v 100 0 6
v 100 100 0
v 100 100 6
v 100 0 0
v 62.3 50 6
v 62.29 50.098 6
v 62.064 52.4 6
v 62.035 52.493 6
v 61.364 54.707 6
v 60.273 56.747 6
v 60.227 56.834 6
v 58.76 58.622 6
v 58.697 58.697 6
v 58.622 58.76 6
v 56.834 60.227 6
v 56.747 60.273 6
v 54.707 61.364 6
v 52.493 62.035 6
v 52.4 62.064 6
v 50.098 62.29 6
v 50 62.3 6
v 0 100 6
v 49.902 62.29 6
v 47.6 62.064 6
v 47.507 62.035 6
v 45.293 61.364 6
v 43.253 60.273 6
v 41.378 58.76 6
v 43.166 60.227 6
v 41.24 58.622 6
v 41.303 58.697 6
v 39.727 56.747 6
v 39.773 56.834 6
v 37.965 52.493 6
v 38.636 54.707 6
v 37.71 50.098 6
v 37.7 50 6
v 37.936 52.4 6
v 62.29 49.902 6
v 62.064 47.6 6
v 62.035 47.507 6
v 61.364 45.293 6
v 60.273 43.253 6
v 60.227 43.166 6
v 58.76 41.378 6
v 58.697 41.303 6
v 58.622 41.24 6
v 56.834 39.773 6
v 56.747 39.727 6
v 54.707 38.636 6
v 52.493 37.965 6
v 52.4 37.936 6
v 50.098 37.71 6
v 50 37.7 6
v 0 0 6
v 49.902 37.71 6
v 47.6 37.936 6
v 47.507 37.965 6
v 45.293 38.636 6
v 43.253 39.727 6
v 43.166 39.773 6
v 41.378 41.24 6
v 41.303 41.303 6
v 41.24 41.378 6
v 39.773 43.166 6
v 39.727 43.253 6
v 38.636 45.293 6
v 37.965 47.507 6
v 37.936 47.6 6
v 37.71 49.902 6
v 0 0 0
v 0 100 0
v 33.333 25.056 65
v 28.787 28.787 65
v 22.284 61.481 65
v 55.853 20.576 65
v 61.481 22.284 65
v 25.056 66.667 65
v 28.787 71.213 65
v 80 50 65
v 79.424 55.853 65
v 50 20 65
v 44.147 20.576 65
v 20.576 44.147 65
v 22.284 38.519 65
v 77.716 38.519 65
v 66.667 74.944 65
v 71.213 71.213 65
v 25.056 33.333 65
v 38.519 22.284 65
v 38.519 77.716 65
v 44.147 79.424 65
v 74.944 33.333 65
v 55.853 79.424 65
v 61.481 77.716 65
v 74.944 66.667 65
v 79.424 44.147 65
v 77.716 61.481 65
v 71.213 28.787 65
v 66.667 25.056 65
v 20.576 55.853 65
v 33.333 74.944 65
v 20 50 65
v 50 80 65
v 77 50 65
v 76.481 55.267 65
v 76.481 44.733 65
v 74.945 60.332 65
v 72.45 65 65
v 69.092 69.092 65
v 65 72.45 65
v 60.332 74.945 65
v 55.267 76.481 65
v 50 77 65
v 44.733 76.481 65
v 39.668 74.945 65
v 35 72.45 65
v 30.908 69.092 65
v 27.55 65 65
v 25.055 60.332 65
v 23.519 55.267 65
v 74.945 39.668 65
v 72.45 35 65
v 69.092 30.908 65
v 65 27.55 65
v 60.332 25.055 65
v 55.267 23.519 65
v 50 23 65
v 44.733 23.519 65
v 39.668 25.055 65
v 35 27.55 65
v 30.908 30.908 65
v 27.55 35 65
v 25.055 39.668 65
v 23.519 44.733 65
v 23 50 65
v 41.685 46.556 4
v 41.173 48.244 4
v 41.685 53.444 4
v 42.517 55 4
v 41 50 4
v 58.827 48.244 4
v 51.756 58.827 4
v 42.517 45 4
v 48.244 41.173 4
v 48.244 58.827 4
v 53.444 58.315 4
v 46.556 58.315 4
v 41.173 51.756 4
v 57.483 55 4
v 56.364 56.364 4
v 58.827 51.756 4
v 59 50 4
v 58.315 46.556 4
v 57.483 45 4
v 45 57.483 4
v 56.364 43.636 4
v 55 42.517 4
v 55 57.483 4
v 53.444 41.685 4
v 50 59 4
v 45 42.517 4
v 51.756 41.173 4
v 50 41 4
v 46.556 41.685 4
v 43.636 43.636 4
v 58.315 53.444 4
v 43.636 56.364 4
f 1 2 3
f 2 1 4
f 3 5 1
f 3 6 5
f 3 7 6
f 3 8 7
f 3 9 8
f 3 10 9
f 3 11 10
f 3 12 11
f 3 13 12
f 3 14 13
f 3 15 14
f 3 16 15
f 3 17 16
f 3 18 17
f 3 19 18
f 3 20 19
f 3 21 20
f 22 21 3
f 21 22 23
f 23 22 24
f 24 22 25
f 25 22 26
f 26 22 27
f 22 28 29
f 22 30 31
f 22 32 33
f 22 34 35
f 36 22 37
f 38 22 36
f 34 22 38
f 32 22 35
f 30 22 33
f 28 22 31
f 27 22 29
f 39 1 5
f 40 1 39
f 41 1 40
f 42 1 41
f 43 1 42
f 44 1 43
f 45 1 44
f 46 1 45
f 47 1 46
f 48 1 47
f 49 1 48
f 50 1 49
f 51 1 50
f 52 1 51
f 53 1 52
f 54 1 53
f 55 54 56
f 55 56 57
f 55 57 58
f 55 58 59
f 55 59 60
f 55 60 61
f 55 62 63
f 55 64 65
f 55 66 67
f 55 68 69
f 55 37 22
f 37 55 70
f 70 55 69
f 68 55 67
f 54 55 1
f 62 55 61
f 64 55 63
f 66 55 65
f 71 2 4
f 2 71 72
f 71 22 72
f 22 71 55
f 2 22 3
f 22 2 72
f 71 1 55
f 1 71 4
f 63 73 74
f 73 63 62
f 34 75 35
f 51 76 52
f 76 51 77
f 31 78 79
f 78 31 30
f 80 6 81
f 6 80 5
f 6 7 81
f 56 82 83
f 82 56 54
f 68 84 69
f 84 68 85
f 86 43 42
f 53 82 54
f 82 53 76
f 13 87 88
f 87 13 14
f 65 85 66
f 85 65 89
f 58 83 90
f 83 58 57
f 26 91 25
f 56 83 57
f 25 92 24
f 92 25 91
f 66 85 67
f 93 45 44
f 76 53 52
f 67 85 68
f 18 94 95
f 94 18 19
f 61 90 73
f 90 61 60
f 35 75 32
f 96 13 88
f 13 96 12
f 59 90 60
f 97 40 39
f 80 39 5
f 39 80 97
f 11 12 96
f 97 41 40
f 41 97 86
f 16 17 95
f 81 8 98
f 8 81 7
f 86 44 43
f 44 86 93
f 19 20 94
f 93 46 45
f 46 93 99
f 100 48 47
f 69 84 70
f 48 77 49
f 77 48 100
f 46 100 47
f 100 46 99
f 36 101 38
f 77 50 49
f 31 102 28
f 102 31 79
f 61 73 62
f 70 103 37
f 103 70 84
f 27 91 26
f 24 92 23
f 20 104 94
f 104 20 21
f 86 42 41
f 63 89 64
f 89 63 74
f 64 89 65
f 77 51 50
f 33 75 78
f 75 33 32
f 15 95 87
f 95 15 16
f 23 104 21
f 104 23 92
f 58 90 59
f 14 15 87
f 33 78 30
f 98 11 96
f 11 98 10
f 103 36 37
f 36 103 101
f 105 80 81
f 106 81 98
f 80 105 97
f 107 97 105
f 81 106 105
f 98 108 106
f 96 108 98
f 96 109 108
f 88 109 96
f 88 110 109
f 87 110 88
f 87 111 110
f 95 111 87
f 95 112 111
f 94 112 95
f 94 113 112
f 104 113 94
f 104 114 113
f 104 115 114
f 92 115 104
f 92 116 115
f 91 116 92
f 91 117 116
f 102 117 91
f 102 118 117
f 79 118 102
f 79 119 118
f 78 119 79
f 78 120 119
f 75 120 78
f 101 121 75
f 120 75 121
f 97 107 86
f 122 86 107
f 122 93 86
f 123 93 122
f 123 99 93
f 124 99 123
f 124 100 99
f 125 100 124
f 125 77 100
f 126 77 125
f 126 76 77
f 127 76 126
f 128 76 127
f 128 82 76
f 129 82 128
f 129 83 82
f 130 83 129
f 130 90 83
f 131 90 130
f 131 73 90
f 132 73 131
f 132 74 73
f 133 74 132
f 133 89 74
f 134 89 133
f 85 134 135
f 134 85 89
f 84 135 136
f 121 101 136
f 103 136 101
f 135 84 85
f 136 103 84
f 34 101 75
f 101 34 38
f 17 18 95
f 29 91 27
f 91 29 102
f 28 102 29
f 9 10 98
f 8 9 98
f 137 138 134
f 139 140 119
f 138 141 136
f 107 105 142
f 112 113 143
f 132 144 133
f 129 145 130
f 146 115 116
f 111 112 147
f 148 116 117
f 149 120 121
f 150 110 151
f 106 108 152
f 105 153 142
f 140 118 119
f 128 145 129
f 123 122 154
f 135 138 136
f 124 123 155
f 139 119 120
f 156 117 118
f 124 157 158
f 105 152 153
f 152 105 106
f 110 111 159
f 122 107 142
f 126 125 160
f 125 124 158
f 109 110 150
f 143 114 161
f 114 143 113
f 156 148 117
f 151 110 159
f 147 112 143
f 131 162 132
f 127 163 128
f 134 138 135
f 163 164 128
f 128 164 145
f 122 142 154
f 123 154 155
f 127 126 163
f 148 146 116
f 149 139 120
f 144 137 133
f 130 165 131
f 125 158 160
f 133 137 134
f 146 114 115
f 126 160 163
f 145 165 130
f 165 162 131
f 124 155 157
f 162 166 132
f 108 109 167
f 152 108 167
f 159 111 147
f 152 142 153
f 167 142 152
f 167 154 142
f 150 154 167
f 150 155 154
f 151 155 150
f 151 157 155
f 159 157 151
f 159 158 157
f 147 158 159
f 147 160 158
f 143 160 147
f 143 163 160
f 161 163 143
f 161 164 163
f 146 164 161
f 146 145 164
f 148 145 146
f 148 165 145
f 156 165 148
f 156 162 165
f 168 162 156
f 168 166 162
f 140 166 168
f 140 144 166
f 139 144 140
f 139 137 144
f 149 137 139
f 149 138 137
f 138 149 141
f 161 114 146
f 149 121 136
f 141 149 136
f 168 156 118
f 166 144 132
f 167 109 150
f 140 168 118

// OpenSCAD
$fn = 32;

// ----------------------------------------------------------------------
// Hopper: funnel with square flange
// ----------------------------------------------------------------------

// --- parameters (mm) ---
fl = 100;                 // flange side, X and Y
fl_t = 6;                 // flange thickness
cone_h = 60;              // cone height above the flange
top_d = 60;               // cone mouth diameter
bot_d = 24;               // cone spout diameter
wall = 3;                 // cone wall thickness

bore_d = bot_d - 2 * wall;  // spout bore diameter
total_h = fl_t + cone_h - 1;  // overall height

difference() {
  union() {
    cube([fl, fl, fl_t]);
    translate([fl / 2, fl / 2, fl_t - 1])
      cylinder(h = cone_h, d1 = bot_d, d2 = top_d);
  }
  translate([fl / 2, fl / 2, fl_t - 2])
    cylinder(h = cone_h + 1, d1 = bore_d, d2 = top_d - 2 * wall);
}
